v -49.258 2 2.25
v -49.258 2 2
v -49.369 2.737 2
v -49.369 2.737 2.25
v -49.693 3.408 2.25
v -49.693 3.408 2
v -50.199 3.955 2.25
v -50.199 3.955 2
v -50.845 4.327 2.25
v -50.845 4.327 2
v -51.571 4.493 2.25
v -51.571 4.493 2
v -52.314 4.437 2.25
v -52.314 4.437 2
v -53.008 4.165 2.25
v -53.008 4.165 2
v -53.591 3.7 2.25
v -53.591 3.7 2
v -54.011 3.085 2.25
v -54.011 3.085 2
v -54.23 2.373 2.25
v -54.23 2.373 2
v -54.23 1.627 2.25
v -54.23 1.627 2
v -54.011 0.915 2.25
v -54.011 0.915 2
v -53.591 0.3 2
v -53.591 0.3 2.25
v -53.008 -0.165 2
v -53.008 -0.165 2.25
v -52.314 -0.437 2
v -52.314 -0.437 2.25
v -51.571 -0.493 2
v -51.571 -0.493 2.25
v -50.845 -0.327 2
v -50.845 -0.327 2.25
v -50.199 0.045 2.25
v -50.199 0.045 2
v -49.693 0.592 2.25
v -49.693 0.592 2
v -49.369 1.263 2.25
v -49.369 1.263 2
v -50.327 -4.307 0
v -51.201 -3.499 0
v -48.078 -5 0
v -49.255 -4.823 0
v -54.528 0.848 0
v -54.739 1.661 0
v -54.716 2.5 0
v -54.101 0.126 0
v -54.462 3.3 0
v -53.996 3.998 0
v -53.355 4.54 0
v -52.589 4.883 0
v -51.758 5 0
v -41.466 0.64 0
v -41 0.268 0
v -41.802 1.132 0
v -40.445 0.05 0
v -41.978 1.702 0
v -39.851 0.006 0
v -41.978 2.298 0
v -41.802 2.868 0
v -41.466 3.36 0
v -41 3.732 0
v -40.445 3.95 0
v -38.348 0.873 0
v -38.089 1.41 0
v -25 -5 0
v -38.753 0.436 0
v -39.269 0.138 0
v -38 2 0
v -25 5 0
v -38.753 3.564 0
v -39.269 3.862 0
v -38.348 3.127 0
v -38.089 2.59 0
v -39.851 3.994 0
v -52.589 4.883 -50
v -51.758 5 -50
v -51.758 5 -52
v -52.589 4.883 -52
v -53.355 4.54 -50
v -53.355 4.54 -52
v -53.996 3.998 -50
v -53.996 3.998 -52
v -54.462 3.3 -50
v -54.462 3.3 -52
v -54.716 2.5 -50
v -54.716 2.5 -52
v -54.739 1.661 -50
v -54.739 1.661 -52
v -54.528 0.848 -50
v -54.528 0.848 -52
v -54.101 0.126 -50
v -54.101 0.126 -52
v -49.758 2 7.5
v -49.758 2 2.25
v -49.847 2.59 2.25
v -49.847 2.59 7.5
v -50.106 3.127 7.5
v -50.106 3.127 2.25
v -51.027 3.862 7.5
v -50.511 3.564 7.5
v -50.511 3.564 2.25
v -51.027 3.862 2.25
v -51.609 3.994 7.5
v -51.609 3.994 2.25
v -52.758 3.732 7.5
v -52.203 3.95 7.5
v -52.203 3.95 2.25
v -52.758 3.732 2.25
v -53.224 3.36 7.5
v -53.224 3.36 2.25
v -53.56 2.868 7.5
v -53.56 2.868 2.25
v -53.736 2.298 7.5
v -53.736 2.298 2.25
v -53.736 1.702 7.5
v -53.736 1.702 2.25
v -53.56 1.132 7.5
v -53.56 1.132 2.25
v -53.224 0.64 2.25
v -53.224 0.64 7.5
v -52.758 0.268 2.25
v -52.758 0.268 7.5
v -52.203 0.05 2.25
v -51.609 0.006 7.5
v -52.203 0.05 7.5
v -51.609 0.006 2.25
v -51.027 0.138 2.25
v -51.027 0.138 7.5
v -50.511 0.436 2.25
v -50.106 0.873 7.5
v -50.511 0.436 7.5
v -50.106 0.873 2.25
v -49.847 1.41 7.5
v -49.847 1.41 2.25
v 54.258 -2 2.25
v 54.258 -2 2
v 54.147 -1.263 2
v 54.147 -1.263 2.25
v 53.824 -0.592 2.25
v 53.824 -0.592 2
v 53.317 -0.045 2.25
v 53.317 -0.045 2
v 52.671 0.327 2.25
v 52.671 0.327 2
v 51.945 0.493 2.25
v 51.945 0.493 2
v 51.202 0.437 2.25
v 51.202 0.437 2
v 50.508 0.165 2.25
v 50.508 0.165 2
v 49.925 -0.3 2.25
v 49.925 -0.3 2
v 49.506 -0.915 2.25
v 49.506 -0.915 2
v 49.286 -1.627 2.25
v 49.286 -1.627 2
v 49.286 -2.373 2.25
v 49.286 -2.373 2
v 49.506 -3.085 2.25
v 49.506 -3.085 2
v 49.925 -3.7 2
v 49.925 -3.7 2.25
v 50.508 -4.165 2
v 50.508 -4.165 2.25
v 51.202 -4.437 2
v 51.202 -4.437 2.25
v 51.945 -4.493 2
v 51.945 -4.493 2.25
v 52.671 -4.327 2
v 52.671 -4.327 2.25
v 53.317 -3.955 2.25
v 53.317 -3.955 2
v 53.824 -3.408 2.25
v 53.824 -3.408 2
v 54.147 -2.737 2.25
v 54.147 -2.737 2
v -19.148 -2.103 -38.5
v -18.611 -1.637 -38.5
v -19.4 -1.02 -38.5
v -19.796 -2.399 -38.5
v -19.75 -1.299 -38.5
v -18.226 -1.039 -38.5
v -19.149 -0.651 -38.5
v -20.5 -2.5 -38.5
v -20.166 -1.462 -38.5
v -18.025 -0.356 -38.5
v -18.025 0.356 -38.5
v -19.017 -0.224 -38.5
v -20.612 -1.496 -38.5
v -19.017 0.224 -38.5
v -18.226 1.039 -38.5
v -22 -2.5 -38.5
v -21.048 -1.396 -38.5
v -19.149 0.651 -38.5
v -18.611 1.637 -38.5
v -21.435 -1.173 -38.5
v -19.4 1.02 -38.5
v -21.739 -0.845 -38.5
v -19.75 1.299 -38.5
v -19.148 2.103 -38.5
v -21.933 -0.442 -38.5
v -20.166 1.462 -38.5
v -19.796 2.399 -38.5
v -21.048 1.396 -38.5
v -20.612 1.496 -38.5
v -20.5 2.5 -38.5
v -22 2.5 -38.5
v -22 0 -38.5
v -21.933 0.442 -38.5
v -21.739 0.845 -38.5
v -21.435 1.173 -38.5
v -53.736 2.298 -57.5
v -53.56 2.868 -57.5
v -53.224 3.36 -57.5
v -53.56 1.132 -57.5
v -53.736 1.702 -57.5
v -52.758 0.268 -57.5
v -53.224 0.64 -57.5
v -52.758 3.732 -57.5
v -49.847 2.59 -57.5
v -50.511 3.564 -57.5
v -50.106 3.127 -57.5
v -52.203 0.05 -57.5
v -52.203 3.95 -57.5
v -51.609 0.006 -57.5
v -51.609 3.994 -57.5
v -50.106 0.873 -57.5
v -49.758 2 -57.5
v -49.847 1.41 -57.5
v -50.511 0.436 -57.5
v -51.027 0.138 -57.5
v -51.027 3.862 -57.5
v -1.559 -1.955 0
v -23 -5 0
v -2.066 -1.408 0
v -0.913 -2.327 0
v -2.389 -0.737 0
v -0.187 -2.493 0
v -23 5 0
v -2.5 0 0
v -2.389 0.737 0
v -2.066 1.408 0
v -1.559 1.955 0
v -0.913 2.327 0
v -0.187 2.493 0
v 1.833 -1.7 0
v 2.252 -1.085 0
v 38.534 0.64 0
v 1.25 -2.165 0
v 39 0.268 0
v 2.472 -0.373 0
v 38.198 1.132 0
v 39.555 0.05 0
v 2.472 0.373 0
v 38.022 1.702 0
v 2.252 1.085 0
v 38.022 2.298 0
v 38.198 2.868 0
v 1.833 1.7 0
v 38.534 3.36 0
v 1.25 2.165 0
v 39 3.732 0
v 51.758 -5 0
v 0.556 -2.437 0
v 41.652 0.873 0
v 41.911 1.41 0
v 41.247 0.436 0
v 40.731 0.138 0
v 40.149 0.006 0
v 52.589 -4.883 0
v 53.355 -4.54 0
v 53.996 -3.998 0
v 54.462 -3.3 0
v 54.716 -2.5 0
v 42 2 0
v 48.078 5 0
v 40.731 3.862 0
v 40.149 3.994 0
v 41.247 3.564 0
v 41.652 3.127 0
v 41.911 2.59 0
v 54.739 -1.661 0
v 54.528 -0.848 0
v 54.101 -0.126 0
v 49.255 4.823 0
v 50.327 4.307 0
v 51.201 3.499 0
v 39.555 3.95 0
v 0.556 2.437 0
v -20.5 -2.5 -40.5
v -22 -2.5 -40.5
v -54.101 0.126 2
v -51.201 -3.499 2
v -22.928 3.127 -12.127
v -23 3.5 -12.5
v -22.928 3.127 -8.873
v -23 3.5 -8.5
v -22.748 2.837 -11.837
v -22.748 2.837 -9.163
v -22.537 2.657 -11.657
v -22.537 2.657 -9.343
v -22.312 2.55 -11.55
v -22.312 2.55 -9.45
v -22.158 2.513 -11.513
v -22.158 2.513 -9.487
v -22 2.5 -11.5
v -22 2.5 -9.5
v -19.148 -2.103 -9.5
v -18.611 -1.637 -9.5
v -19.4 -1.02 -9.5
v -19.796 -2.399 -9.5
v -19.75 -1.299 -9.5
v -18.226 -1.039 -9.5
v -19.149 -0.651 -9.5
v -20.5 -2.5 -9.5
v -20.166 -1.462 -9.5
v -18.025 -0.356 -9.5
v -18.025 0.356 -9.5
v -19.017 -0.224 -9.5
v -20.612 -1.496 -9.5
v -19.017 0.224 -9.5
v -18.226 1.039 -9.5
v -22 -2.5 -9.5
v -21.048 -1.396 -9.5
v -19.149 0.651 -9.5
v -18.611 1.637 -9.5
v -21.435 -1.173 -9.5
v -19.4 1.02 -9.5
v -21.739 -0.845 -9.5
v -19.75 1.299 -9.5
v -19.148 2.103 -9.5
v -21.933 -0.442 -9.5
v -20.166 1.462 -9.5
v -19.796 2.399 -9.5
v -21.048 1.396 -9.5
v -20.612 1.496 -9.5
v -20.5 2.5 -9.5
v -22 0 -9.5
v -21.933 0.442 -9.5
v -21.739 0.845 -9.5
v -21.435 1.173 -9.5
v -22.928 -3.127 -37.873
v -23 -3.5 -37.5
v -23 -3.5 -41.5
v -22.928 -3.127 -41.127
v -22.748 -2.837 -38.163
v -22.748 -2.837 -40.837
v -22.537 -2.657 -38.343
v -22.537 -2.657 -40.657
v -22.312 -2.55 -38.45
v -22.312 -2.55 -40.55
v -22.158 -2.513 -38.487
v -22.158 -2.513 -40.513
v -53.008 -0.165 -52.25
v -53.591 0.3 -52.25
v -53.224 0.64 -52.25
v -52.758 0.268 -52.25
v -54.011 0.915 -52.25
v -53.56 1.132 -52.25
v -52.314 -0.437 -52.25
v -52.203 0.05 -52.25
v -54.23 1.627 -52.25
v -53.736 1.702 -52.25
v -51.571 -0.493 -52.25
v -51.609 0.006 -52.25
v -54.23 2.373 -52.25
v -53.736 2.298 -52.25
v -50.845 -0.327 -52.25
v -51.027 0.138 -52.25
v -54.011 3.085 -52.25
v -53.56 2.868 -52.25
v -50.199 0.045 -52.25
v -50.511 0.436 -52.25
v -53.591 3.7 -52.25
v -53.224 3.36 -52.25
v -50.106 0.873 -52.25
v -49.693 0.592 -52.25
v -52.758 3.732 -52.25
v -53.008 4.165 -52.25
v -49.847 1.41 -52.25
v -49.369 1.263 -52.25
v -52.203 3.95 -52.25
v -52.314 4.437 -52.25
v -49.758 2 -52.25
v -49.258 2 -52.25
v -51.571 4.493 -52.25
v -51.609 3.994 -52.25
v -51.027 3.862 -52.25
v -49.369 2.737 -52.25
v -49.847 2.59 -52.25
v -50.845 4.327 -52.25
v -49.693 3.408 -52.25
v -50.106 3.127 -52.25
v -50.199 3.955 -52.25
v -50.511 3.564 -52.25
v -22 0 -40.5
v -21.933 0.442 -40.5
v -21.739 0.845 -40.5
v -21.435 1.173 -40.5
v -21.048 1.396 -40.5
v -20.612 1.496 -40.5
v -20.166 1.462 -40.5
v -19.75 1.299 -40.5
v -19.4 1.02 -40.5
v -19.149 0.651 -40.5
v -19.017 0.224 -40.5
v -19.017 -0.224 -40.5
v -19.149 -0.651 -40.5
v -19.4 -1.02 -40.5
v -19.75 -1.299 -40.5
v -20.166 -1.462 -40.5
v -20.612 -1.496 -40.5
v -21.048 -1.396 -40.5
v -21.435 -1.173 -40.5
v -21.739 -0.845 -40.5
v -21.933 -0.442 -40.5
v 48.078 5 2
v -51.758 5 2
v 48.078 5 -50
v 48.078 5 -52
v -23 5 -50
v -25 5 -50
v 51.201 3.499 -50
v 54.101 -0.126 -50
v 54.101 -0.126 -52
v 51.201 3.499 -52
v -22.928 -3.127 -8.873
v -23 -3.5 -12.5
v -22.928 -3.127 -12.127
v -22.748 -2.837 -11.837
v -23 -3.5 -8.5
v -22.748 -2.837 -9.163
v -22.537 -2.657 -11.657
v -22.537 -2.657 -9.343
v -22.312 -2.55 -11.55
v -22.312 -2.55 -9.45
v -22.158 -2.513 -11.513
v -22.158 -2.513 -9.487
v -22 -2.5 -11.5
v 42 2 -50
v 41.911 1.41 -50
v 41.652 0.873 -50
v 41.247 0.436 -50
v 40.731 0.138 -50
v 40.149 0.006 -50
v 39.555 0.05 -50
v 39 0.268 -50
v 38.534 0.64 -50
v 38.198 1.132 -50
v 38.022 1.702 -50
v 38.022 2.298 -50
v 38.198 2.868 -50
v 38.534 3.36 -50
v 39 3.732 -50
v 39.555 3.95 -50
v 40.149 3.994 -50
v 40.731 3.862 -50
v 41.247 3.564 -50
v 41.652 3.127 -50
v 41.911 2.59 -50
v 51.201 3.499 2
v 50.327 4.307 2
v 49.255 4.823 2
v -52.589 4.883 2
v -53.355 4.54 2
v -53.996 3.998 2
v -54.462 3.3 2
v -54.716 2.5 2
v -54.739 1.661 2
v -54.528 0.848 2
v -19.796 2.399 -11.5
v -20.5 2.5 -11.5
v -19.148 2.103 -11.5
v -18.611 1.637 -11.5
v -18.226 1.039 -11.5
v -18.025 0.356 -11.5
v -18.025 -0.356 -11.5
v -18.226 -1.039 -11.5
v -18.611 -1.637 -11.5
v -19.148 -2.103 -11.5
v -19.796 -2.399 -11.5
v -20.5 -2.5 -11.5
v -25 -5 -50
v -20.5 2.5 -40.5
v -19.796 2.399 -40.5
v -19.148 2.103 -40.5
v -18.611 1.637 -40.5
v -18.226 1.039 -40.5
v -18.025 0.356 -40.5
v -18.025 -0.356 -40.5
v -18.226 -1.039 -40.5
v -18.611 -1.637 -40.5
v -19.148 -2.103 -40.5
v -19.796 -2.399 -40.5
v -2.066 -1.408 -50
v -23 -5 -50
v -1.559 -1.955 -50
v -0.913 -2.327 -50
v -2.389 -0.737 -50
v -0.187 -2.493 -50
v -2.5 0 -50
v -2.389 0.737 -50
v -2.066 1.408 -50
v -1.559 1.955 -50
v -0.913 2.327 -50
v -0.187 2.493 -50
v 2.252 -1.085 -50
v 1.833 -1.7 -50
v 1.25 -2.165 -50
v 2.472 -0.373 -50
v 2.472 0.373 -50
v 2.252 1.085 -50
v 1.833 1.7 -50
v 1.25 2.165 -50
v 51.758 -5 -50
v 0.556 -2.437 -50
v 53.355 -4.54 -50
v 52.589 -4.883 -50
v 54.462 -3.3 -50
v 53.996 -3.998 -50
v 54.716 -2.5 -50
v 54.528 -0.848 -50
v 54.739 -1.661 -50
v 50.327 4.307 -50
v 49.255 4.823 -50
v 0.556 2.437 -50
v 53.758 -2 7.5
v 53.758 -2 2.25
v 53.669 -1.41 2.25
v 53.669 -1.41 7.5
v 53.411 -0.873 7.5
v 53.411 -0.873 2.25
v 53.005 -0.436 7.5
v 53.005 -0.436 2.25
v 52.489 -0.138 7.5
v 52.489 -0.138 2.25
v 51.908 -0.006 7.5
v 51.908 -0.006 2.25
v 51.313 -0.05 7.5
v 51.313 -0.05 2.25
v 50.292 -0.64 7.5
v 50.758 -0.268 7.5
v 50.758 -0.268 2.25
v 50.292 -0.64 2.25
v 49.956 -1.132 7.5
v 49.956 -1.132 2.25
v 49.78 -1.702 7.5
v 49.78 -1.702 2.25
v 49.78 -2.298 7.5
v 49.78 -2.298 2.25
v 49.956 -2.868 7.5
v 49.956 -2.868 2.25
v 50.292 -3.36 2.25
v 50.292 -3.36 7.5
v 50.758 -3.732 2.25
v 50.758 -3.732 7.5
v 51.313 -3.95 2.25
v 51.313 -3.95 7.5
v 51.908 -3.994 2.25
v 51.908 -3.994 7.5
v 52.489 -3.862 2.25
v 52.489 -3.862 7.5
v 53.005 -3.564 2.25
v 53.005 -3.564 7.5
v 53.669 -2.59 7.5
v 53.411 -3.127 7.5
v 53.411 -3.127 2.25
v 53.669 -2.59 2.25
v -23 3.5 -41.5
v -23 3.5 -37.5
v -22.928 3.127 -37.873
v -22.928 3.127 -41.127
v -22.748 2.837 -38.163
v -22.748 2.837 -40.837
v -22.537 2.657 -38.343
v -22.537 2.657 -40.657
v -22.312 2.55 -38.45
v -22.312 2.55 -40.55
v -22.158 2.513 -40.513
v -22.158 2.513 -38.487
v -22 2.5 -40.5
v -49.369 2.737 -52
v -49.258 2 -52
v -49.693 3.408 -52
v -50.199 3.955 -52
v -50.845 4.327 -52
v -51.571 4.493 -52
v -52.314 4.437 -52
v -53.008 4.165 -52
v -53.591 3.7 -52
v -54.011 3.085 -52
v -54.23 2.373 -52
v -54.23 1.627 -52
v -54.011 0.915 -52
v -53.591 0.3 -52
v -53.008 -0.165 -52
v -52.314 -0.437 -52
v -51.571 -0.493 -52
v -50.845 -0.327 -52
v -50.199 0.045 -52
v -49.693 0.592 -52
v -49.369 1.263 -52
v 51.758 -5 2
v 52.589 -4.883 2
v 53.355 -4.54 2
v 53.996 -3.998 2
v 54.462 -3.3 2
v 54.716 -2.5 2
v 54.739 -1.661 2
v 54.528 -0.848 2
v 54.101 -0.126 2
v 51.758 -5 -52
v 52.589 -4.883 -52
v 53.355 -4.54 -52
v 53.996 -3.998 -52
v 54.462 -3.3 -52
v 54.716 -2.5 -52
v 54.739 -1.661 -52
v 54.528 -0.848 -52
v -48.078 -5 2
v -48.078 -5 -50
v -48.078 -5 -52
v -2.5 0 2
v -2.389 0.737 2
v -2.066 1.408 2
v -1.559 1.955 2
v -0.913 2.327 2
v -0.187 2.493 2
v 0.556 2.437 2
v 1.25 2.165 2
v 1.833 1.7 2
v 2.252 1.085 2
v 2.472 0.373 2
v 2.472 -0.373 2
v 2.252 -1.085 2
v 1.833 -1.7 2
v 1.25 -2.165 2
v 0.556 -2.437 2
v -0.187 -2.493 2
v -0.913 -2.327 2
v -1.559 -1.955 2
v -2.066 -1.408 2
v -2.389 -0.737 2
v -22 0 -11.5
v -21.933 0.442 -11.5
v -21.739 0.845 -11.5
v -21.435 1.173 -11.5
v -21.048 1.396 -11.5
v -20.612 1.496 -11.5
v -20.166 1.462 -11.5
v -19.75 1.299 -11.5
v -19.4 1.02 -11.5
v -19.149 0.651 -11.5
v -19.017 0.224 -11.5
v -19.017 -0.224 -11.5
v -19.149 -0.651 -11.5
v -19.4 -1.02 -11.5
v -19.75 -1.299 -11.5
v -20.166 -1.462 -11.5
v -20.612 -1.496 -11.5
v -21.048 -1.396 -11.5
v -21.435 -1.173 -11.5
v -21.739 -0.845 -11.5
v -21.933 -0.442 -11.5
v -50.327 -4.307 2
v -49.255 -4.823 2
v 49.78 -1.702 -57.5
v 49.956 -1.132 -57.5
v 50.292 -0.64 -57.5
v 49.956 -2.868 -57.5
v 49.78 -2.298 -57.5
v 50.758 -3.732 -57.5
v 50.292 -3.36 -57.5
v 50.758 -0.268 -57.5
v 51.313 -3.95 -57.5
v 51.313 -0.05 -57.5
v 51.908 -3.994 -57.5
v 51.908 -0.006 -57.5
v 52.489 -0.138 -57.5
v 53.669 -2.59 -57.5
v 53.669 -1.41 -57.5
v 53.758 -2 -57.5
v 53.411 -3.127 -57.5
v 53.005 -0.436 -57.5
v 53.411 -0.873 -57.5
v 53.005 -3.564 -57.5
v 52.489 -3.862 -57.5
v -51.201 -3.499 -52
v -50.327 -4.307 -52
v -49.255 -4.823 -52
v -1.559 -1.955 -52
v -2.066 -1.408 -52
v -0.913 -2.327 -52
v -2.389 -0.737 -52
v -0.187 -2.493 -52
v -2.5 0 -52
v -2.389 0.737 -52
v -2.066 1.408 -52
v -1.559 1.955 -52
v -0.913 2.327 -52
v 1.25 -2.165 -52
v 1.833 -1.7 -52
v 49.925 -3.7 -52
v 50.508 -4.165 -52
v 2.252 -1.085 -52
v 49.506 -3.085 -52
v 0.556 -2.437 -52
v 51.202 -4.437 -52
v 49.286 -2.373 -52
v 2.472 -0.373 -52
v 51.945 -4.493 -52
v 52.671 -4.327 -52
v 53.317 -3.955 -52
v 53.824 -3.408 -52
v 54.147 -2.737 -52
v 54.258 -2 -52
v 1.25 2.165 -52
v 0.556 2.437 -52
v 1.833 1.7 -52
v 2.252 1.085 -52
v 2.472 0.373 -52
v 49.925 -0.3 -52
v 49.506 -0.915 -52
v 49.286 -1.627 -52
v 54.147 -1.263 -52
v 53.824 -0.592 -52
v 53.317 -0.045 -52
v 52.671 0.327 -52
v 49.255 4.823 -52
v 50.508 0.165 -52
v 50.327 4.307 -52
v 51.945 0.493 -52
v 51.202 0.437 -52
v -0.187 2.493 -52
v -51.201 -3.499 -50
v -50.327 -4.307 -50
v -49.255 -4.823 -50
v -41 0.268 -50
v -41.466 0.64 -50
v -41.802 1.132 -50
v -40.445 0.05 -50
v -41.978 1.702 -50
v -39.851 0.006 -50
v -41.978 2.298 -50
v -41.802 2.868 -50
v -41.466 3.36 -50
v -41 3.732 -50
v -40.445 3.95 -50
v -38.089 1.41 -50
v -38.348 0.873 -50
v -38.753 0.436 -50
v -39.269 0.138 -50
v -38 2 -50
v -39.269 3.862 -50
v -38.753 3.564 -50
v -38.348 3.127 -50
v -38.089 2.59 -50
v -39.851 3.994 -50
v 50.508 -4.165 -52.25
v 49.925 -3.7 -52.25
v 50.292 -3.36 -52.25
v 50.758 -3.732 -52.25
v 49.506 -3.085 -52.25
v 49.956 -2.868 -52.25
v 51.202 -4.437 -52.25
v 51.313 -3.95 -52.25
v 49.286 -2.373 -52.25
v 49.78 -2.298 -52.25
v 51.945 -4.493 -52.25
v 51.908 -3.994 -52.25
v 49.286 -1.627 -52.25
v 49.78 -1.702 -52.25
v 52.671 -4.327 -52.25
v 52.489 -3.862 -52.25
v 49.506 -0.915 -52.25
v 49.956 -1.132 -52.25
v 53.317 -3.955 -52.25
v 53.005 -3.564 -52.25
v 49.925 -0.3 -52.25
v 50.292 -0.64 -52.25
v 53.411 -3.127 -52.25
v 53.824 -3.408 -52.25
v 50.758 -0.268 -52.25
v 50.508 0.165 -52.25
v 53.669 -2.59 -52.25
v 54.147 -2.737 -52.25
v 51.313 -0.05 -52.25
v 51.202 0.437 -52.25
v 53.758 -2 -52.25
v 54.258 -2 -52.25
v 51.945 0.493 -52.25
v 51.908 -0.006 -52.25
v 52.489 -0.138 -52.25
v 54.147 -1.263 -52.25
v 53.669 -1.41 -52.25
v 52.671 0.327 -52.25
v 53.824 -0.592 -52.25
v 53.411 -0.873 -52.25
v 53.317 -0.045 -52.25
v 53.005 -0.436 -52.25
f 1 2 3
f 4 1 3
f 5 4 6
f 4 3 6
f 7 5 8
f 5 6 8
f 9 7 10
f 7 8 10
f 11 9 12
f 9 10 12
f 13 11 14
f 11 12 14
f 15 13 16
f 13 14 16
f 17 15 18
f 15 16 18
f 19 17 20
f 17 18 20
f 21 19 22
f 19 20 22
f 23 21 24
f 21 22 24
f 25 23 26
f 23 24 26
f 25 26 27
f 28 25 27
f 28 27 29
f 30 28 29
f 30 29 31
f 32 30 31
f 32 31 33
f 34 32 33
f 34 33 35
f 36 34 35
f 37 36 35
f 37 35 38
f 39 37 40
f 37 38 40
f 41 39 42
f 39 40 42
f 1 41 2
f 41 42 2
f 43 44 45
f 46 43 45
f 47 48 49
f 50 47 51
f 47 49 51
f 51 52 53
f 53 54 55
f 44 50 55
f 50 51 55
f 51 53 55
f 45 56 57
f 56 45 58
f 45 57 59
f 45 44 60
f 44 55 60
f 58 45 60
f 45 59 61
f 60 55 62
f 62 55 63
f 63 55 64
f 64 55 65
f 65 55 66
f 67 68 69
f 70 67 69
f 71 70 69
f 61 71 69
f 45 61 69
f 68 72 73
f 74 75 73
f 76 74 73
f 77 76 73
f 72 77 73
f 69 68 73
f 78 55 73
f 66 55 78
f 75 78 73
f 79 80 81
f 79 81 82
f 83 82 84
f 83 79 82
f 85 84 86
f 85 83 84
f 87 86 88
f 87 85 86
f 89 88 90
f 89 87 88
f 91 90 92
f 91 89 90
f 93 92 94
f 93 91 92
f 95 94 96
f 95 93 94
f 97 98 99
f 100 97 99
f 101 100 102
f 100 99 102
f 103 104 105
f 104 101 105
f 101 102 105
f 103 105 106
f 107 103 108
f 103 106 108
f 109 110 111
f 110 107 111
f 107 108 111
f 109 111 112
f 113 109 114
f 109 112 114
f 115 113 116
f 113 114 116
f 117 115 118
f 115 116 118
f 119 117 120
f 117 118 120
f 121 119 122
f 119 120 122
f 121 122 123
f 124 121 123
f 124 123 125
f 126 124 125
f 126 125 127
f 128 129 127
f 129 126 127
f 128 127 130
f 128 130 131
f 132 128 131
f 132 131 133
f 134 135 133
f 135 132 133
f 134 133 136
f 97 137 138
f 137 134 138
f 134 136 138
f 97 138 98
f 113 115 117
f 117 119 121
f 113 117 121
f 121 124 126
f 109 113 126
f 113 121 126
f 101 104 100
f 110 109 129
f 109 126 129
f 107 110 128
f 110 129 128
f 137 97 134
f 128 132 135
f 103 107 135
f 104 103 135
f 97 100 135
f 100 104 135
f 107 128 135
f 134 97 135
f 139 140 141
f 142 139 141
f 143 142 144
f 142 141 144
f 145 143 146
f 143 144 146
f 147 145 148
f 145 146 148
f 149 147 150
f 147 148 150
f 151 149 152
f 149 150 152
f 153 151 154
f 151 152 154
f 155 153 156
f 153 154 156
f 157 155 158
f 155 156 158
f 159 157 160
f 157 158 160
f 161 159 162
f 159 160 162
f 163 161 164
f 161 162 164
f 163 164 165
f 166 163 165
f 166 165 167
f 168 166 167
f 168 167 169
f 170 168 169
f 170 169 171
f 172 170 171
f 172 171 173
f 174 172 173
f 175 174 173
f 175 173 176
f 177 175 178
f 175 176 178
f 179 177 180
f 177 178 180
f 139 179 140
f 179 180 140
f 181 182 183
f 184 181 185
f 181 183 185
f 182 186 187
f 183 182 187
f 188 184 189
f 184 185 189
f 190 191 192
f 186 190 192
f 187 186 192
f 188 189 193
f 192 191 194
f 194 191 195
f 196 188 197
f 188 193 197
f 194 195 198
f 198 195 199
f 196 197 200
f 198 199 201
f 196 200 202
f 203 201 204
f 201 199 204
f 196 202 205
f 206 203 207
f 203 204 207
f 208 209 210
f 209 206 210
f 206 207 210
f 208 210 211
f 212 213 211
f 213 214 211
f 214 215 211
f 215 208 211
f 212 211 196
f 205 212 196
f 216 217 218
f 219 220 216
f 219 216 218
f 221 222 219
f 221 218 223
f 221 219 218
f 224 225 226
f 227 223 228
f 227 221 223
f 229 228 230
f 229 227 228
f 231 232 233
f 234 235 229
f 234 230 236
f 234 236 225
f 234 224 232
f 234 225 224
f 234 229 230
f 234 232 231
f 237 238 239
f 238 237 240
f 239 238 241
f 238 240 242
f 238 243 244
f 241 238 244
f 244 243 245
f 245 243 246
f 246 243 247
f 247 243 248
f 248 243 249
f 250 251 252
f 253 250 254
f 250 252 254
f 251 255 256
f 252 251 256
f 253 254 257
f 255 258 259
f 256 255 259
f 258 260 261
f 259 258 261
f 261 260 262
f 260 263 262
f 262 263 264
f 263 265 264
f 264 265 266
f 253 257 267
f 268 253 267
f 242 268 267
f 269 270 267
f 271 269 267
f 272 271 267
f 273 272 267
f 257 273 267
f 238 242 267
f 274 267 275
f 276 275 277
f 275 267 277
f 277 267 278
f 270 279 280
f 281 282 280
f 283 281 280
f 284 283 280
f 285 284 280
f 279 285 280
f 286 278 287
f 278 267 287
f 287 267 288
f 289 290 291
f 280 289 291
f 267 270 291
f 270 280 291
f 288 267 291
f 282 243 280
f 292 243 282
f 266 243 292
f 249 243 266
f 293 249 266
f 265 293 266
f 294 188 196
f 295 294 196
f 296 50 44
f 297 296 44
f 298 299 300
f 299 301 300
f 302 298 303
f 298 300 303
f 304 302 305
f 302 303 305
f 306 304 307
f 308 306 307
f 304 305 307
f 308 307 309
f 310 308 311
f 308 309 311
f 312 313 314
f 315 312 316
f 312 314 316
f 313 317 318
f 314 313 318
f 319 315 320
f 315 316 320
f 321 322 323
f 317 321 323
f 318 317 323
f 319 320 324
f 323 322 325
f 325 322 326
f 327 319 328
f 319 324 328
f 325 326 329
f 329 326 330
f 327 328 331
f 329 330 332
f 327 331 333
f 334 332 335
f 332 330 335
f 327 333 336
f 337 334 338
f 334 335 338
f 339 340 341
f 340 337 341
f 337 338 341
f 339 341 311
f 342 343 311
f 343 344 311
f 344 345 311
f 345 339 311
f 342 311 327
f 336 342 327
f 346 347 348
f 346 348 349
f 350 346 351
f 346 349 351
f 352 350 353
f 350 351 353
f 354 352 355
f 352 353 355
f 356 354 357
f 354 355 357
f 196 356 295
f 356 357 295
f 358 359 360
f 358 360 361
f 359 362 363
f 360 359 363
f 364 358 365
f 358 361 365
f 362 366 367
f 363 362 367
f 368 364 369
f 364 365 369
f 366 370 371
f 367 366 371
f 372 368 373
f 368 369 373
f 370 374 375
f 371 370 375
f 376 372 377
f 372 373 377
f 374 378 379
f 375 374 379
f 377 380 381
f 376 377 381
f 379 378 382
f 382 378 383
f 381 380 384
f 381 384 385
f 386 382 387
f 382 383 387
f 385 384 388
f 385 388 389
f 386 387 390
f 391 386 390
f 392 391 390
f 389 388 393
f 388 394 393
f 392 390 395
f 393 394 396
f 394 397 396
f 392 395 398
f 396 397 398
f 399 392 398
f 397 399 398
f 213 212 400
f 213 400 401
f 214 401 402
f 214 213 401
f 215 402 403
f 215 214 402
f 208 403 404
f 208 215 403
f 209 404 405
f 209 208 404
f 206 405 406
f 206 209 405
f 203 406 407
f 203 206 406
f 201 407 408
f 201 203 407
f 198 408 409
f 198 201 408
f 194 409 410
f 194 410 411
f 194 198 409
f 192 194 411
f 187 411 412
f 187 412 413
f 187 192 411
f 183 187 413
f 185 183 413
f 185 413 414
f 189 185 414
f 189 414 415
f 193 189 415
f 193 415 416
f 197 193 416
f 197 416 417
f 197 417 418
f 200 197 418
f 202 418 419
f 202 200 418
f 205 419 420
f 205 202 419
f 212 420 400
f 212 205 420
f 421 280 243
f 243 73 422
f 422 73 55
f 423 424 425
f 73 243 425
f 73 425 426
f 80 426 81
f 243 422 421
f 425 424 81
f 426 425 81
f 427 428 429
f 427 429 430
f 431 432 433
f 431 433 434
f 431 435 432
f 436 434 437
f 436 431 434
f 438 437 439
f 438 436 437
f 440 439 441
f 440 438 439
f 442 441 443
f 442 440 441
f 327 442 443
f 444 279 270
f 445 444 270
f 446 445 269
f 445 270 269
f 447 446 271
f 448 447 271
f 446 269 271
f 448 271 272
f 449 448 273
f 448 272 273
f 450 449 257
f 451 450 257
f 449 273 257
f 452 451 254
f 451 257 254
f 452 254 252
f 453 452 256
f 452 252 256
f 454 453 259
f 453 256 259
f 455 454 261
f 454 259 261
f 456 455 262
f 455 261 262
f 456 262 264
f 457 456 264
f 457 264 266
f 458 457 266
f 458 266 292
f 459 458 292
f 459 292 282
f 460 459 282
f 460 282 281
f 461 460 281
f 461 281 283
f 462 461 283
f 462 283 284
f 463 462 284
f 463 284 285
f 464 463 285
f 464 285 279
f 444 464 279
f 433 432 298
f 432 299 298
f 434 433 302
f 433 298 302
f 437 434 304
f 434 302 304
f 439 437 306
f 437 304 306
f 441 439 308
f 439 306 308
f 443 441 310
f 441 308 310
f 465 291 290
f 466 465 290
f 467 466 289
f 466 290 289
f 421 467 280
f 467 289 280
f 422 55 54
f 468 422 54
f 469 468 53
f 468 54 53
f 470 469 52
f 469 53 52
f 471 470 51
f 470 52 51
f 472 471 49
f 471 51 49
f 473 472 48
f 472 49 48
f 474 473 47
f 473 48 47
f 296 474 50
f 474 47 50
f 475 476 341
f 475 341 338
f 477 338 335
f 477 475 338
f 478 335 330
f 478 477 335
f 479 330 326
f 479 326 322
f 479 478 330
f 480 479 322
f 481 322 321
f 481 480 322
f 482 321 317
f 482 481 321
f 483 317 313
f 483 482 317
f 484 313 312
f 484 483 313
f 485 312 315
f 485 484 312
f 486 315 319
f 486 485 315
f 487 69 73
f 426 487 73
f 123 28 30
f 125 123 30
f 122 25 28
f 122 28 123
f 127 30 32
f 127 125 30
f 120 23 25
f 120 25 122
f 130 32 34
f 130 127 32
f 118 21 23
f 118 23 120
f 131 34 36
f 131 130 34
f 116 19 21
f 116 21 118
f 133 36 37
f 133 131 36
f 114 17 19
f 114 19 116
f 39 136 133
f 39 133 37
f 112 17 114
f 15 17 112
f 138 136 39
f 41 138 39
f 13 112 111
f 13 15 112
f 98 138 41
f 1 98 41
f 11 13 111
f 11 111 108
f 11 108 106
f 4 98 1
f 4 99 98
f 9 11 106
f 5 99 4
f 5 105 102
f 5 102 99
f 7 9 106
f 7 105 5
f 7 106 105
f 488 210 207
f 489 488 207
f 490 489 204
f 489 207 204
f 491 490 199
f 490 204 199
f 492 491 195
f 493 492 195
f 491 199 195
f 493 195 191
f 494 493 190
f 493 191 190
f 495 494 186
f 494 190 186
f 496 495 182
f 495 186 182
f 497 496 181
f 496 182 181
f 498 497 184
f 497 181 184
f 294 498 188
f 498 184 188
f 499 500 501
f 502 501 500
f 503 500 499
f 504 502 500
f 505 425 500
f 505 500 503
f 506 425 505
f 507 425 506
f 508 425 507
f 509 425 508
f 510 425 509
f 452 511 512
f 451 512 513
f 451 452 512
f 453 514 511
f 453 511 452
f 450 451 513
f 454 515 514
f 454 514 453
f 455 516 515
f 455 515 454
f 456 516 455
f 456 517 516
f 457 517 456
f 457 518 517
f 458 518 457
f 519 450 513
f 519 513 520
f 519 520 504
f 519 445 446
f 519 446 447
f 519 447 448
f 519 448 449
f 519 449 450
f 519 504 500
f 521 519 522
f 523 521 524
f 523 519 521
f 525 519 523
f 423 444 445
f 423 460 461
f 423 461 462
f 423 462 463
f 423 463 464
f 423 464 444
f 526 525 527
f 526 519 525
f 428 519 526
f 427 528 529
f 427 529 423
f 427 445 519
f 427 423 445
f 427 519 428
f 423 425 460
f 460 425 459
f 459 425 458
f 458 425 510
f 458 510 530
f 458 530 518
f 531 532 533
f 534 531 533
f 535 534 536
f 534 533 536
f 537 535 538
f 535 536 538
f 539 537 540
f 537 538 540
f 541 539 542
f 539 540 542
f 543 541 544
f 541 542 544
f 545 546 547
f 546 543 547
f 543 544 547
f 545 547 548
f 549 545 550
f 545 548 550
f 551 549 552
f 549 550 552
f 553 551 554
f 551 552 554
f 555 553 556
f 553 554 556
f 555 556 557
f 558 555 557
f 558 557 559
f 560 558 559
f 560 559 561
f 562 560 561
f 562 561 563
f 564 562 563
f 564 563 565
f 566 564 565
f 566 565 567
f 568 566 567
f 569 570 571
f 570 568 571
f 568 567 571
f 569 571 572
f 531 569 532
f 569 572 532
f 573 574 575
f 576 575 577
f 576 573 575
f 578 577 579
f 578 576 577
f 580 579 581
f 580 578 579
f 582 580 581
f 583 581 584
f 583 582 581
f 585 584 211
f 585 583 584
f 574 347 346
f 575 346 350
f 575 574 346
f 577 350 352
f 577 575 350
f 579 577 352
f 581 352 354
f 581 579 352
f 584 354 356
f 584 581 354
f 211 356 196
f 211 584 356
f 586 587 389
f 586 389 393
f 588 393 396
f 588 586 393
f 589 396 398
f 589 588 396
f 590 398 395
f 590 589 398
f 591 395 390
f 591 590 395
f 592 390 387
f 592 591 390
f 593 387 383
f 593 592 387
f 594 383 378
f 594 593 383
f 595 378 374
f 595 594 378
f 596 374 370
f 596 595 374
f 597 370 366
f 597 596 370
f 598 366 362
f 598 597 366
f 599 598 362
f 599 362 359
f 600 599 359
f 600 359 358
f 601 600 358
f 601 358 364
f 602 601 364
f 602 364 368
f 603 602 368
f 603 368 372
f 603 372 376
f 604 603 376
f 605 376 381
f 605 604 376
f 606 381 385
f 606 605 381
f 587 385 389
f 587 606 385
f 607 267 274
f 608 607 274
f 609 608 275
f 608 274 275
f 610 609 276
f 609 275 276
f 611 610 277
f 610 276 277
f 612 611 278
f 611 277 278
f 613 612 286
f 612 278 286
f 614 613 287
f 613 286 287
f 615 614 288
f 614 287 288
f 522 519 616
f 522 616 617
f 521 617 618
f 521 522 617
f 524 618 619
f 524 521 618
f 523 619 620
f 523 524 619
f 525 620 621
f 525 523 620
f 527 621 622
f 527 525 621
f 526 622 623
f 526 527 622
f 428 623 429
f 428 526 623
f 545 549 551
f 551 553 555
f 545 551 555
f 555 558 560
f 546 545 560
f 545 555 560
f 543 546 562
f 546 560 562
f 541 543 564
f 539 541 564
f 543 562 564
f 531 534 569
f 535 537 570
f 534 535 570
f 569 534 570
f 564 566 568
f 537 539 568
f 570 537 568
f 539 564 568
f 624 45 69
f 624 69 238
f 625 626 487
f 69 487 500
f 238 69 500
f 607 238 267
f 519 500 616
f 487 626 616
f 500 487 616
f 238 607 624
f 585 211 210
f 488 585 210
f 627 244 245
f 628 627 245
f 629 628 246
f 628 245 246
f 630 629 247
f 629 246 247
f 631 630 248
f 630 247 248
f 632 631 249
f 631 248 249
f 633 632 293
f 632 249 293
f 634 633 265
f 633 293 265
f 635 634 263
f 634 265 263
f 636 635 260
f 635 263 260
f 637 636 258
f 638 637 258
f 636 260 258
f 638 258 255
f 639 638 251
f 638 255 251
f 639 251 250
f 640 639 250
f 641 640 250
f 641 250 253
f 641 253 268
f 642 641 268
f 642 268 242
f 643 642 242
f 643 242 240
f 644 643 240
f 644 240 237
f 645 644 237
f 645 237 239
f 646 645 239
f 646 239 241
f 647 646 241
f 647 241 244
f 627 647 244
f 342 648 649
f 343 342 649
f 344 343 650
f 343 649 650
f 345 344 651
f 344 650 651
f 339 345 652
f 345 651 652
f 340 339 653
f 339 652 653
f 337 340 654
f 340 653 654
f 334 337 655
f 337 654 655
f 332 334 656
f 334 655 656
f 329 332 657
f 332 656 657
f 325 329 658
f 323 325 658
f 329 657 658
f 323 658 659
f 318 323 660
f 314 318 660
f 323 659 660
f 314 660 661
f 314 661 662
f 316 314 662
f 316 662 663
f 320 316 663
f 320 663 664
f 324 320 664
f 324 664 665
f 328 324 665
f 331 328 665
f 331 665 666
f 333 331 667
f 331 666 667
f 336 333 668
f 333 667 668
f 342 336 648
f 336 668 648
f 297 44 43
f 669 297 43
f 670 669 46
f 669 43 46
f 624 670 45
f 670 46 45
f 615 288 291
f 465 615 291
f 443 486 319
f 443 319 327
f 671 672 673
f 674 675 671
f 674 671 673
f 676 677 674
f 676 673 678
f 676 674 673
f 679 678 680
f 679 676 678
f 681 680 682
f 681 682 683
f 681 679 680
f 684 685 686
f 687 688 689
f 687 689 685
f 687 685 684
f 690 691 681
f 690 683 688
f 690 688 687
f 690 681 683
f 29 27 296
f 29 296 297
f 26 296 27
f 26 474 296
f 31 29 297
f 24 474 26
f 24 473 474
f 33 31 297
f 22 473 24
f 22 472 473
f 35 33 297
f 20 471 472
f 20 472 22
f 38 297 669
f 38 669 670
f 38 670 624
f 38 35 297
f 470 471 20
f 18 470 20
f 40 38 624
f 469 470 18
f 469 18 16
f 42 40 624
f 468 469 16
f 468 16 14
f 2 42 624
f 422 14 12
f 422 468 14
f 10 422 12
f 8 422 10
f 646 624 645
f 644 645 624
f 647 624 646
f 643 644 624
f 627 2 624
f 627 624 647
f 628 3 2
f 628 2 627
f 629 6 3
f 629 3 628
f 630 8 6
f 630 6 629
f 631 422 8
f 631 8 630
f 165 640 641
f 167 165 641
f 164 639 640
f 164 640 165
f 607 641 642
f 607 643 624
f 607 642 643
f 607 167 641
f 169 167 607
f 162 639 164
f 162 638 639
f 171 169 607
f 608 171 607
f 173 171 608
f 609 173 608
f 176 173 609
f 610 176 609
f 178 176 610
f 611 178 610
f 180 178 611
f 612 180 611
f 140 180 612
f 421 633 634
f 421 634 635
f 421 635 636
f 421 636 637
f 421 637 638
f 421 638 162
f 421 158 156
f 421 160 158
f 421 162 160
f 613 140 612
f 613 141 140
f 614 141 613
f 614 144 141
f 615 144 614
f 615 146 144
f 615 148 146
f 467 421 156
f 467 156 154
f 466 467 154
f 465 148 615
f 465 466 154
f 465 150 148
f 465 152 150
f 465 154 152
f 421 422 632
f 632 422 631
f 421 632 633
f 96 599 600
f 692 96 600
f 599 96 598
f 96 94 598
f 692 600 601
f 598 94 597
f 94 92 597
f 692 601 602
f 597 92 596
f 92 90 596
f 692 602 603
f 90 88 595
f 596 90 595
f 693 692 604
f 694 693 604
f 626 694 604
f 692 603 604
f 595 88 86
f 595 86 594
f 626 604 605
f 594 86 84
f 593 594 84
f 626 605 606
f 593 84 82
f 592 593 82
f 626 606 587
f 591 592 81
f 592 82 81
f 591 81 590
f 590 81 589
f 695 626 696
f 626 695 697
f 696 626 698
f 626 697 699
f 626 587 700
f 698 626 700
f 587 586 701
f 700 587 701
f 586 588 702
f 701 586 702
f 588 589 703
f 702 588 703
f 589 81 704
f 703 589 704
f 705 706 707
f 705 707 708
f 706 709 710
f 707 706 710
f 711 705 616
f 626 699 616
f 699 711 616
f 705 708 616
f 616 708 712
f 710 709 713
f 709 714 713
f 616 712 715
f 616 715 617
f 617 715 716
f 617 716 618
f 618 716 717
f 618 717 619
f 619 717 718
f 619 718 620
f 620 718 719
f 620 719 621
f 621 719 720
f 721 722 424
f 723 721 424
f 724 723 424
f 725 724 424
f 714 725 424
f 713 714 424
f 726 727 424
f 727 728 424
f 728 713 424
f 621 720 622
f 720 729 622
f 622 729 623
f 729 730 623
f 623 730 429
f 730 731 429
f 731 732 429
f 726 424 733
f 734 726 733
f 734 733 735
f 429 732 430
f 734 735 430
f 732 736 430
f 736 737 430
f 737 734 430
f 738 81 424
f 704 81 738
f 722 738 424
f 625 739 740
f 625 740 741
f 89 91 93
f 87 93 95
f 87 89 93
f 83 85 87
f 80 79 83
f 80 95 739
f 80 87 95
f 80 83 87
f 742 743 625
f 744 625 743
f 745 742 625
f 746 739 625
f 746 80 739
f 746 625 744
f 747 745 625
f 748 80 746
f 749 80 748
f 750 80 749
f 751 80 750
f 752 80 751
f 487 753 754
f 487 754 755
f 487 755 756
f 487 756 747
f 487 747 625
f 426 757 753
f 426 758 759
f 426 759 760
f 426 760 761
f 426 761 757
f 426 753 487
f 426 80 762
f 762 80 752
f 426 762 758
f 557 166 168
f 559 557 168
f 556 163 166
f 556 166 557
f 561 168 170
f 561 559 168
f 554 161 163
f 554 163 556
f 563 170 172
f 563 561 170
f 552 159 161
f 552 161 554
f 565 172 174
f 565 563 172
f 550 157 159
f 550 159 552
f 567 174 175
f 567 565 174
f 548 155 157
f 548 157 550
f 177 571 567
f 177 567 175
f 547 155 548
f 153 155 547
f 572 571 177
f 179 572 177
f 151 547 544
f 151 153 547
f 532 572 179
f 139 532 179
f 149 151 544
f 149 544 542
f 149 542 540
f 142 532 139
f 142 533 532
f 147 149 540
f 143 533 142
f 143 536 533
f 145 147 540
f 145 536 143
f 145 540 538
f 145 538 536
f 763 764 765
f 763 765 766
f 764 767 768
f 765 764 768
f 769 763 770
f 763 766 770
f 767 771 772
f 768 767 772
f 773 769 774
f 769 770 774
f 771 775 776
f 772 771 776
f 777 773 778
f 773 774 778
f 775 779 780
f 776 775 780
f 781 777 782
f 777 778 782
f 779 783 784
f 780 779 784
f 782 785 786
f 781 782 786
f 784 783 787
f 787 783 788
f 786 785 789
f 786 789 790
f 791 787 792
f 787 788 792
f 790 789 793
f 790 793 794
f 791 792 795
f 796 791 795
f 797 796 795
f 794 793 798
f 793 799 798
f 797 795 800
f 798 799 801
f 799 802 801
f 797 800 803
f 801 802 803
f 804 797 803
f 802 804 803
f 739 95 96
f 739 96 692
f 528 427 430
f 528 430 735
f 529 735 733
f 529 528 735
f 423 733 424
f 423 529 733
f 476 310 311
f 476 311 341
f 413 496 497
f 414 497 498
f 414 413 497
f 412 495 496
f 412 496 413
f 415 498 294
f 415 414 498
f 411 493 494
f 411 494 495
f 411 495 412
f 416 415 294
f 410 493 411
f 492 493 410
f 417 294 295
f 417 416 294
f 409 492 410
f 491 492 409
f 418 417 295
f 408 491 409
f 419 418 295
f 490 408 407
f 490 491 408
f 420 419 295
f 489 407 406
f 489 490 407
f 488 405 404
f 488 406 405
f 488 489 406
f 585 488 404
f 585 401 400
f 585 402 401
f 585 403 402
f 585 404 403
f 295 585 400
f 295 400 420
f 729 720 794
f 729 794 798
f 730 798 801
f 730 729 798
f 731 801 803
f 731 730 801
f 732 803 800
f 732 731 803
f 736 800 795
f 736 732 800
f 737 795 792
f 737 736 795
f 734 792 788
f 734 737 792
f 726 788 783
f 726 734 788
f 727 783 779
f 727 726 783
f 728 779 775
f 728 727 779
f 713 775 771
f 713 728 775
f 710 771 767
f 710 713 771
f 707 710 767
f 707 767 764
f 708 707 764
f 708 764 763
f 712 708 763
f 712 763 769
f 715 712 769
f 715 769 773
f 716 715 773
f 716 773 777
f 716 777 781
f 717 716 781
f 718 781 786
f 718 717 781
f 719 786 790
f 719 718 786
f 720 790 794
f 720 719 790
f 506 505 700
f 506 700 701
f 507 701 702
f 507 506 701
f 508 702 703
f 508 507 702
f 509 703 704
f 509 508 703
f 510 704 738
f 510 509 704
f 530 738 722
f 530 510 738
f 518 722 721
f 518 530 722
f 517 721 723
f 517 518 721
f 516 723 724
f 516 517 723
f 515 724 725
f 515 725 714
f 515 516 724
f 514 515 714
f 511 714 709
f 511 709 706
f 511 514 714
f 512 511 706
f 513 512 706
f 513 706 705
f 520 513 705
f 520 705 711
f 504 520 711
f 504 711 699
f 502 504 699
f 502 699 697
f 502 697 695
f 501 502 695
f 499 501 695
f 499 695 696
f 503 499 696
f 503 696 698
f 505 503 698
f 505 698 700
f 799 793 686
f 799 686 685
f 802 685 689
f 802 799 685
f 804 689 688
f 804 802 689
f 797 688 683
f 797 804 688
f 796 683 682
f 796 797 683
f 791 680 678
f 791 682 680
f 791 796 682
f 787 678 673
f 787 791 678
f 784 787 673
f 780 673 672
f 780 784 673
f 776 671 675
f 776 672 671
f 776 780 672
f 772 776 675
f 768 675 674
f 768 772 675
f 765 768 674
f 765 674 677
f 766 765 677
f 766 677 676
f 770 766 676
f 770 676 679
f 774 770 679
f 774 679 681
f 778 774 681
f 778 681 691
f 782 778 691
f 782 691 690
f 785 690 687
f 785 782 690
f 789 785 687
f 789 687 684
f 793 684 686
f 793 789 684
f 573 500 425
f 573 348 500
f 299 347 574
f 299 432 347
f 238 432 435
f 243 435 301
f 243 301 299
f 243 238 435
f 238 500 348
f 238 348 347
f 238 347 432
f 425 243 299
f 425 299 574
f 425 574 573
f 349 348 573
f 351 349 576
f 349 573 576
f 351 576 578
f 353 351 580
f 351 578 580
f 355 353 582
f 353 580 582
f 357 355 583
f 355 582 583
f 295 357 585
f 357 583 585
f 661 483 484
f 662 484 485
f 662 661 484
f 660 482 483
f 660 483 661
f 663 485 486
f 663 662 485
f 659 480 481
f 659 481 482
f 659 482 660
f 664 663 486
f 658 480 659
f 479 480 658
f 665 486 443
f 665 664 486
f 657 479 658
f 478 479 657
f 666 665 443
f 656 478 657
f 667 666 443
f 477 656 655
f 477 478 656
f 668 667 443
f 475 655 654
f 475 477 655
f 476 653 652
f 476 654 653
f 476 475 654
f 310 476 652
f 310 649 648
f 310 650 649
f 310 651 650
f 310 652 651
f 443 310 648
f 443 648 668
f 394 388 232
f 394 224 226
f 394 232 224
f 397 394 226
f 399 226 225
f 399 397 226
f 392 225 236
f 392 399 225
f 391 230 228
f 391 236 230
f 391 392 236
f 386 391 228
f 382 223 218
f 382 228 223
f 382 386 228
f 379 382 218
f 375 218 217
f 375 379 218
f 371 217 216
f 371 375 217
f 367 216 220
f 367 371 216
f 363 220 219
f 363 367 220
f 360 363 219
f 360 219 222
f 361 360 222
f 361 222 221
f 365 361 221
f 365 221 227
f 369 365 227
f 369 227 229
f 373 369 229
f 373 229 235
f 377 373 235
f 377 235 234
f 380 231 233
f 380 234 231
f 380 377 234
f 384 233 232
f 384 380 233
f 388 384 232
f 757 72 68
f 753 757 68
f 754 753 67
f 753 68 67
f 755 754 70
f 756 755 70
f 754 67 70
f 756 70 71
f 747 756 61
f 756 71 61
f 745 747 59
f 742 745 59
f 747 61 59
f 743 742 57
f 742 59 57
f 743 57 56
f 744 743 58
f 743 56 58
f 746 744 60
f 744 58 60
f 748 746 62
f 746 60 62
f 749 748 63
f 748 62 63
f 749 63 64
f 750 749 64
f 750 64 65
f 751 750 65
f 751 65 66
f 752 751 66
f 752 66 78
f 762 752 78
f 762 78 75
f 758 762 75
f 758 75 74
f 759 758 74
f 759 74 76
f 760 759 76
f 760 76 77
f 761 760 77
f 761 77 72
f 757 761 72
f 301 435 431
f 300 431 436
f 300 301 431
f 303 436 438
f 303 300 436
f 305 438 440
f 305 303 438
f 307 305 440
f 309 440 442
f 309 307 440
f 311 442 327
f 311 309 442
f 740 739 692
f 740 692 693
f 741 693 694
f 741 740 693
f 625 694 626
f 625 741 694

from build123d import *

# Parameters (mm, degrees)
EXTRUDE_1_DEPTH          = 2
SKETCH_3_R               = 2
EXTRUDE_2_DEPTH          = 9
SKETCH_4_R               = 2
EXTRUDE_3_DEPTH          = 25
SKETCH_5_R               = 2.5
CUT_EXTRUDE_2_DEPTH      = 25
SKETCH_7_R               = 2.5
EXTRUDE_4_DEPTH          = 0.25
CUT_EXTRUDE_3_DEPTH      = 61.402419684
CUT_EXTRUDE_3_DEPTH_BACK = 10
SKETCH_8_W               = 14.774450984
SKETCH_8_H               = 5.235041687
SKETCH_8_W_2             = 21.085271114
SKETCH_8_H_2             = 10.942988806
SKETCH_9_W               = 2
SKETCH_9_H               = 10
EXTRUDE_5_DEPTH          = 54
EXTRUDE_START            = 13.5
SKETCH_10_R              = 1.5
EXTRUDE_6_DEPTH          = 2
FILLET_3_R               = 1
FILLET_3_OF_MIRROR_5_R   = 1


with BuildPart() as part:
    # 草圖1 → 填料-伸長1 (new body)
    with BuildSketch(Plane.XY):
        with BuildLine():
            Line((-48.07750061, -5), (51.758125458, -5))
            ThreePointArc((51.758125458, -5), (54.462035166, -3.299566191), (54.100731886, -0.125914857))
            Line((54.100731886, -0.125914857), (51.200975848, 3.49878019))
            ThreePointArc((51.200975848, 3.49878019), (49.810255532, 4.605212945), (48.07750061, 5))
            Line((48.07750061, 5), (-51.758125458, 5))
            ThreePointArc((-51.758125458, 5), (-54.462035166, 3.299566191), (-54.100731886, 0.125914857))
            Line((-54.100731886, 0.125914857), (-51.200975848, -3.49878019))
            ThreePointArc((-51.200975848, -3.49878019), (-49.810255532, -4.605212945), (-48.07750061, -5))
        make_face()
    extrude(amount=EXTRUDE_1_DEPTH)

    # 草圖3 → 填料-伸長2 (add)
    with BuildSketch(Plane.XY.offset(2)):
        with Locations((-51.758125458, 2)):
            Circle(SKETCH_3_R)
        with Locations((51.758125458, -2)):
            Circle(SKETCH_3_R)
    extrude(amount=EXTRUDE_2_DEPTH)

    # 草圖4 → 填料-伸長3 (add)
    with BuildSketch(Plane(origin=(0, 0, 0), x_dir=(-1, 0, 0), z_dir=(0, 0, -1))):
        with Locations(Location((-40, 2, 0), (0, 0, 180))):
            Circle(SKETCH_4_R)
        with Locations(Location((40, 2, 0), (0, 0, 180))):
            Circle(SKETCH_4_R)
    extrude(amount=EXTRUDE_3_DEPTH)

    # 草圖5 → 除料-伸長2 (cut)
    with BuildSketch(Plane(origin=(0, 0, 0), x_dir=(-1, 0, 0), z_dir=(0, 0, -1))):
        Circle(SKETCH_5_R)
    extrude(amount=-CUT_EXTRUDE_2_DEPTH, mode=Mode.SUBTRACT)

    # 草圖7 → 填料-伸長4 (add)
    with BuildSketch(Plane.XY.offset(2)):
        with Locations((51.758125458, -2)):
            Circle(SKETCH_7_R)
        with Locations((-51.758125458, 2)):
            Circle(SKETCH_7_R)
    extrude(amount=EXTRUDE_4_DEPTH)

    # 草圖8 → 除料-伸長3 (cut, two sides: drawn at the far end of the back side and taken through both)
    with BuildSketch(Plane(origin=(0, 0, 0), x_dir=(1, 0, 0), z_dir=(0, 1, 0)).offset(-CUT_EXTRUDE_3_DEPTH_BACK)):
        with Locations((49.50022751, -10.117520844)):
            Rectangle(SKETCH_8_W, SKETCH_8_H)
        with Locations((-50.795099296, -12.971494403)):
            Rectangle(SKETCH_8_W_2, SKETCH_8_H_2)
    extrude(amount=CUT_EXTRUDE_3_DEPTH + CUT_EXTRUDE_3_DEPTH_BACK, mode=Mode.SUBTRACT)

    # 鏡射1: part across plane


with BuildPart() as part_1:
    add(part.part)
    add(part.part.mirror(Plane(origin=(-40, 2, -25), x_dir=(1, 0, 0), z_dir=(0, 0, 1))))

    # 草圖9 → 填料-伸長5 (add)
    with BuildSketch(Plane.XY.offset(2)):
        with Locations((-24, 0)):
            Rectangle(SKETCH_9_W, SKETCH_9_H)
    extrude(amount=-EXTRUDE_5_DEPTH)

    # 草圖10 → 填料-伸長6 (add)
    with BuildSketch(Plane(origin=(0, 0, -25), x_dir=(-1, 0, 0), z_dir=(0, 0, -1)).offset(EXTRUDE_START)):
        with BuildLine():
            Line((23, 2.5), (20.5, 2.5))
            ThreePointArc((20.5, 2.5), (18, 0), (20.5, -2.5))
            Line((20.5, -2.5), (23, -2.5))
            Line((23, -2.5), (23, 2.5))
        make_face()
        with Locations((20.5, 0)):
            Circle(SKETCH_10_R, mode=Mode.SUBTRACT)
    extrude_6 = extrude(amount=EXTRUDE_6_DEPTH)

    # 圓角3
    fillet_3_edges = [part_1.edges().sort_by_distance(p)[0] for p in [
        (-23, 0, -40.5),
        (-23, 0, -38.5),
        (-23, -2.5, -39.5),
        (-23, 2.5, -39.5),
    ]]
    fillet(fillet_3_edges, radius=FILLET_3_R - 0.0001)  # a hair under: the kernel refuses the full size

    # 鏡射5: 填料-伸長6 across plane
    add(extrude_6.mirror(Plane(origin=(0, 0, -25), x_dir=(1, 0, 0), z_dir=(0, 0, -1))))

    # 圓角3 of 鏡射5
    fillet_3_of_mirror_5_edges = [part_1.edges().sort_by_distance(p)[0] for p in [
        (-23, 0, -9.5),
        (-23, 0, -11.5),
        (-23, -2.5, -10.5),
        (-23, 2.5, -10.5),
    ]]
    fillet(fillet_3_of_mirror_5_edges, radius=FILLET_3_OF_MIRROR_5_R - 0.0001)  # a hair under: the kernel refuses the full size


solid = part_1.part
